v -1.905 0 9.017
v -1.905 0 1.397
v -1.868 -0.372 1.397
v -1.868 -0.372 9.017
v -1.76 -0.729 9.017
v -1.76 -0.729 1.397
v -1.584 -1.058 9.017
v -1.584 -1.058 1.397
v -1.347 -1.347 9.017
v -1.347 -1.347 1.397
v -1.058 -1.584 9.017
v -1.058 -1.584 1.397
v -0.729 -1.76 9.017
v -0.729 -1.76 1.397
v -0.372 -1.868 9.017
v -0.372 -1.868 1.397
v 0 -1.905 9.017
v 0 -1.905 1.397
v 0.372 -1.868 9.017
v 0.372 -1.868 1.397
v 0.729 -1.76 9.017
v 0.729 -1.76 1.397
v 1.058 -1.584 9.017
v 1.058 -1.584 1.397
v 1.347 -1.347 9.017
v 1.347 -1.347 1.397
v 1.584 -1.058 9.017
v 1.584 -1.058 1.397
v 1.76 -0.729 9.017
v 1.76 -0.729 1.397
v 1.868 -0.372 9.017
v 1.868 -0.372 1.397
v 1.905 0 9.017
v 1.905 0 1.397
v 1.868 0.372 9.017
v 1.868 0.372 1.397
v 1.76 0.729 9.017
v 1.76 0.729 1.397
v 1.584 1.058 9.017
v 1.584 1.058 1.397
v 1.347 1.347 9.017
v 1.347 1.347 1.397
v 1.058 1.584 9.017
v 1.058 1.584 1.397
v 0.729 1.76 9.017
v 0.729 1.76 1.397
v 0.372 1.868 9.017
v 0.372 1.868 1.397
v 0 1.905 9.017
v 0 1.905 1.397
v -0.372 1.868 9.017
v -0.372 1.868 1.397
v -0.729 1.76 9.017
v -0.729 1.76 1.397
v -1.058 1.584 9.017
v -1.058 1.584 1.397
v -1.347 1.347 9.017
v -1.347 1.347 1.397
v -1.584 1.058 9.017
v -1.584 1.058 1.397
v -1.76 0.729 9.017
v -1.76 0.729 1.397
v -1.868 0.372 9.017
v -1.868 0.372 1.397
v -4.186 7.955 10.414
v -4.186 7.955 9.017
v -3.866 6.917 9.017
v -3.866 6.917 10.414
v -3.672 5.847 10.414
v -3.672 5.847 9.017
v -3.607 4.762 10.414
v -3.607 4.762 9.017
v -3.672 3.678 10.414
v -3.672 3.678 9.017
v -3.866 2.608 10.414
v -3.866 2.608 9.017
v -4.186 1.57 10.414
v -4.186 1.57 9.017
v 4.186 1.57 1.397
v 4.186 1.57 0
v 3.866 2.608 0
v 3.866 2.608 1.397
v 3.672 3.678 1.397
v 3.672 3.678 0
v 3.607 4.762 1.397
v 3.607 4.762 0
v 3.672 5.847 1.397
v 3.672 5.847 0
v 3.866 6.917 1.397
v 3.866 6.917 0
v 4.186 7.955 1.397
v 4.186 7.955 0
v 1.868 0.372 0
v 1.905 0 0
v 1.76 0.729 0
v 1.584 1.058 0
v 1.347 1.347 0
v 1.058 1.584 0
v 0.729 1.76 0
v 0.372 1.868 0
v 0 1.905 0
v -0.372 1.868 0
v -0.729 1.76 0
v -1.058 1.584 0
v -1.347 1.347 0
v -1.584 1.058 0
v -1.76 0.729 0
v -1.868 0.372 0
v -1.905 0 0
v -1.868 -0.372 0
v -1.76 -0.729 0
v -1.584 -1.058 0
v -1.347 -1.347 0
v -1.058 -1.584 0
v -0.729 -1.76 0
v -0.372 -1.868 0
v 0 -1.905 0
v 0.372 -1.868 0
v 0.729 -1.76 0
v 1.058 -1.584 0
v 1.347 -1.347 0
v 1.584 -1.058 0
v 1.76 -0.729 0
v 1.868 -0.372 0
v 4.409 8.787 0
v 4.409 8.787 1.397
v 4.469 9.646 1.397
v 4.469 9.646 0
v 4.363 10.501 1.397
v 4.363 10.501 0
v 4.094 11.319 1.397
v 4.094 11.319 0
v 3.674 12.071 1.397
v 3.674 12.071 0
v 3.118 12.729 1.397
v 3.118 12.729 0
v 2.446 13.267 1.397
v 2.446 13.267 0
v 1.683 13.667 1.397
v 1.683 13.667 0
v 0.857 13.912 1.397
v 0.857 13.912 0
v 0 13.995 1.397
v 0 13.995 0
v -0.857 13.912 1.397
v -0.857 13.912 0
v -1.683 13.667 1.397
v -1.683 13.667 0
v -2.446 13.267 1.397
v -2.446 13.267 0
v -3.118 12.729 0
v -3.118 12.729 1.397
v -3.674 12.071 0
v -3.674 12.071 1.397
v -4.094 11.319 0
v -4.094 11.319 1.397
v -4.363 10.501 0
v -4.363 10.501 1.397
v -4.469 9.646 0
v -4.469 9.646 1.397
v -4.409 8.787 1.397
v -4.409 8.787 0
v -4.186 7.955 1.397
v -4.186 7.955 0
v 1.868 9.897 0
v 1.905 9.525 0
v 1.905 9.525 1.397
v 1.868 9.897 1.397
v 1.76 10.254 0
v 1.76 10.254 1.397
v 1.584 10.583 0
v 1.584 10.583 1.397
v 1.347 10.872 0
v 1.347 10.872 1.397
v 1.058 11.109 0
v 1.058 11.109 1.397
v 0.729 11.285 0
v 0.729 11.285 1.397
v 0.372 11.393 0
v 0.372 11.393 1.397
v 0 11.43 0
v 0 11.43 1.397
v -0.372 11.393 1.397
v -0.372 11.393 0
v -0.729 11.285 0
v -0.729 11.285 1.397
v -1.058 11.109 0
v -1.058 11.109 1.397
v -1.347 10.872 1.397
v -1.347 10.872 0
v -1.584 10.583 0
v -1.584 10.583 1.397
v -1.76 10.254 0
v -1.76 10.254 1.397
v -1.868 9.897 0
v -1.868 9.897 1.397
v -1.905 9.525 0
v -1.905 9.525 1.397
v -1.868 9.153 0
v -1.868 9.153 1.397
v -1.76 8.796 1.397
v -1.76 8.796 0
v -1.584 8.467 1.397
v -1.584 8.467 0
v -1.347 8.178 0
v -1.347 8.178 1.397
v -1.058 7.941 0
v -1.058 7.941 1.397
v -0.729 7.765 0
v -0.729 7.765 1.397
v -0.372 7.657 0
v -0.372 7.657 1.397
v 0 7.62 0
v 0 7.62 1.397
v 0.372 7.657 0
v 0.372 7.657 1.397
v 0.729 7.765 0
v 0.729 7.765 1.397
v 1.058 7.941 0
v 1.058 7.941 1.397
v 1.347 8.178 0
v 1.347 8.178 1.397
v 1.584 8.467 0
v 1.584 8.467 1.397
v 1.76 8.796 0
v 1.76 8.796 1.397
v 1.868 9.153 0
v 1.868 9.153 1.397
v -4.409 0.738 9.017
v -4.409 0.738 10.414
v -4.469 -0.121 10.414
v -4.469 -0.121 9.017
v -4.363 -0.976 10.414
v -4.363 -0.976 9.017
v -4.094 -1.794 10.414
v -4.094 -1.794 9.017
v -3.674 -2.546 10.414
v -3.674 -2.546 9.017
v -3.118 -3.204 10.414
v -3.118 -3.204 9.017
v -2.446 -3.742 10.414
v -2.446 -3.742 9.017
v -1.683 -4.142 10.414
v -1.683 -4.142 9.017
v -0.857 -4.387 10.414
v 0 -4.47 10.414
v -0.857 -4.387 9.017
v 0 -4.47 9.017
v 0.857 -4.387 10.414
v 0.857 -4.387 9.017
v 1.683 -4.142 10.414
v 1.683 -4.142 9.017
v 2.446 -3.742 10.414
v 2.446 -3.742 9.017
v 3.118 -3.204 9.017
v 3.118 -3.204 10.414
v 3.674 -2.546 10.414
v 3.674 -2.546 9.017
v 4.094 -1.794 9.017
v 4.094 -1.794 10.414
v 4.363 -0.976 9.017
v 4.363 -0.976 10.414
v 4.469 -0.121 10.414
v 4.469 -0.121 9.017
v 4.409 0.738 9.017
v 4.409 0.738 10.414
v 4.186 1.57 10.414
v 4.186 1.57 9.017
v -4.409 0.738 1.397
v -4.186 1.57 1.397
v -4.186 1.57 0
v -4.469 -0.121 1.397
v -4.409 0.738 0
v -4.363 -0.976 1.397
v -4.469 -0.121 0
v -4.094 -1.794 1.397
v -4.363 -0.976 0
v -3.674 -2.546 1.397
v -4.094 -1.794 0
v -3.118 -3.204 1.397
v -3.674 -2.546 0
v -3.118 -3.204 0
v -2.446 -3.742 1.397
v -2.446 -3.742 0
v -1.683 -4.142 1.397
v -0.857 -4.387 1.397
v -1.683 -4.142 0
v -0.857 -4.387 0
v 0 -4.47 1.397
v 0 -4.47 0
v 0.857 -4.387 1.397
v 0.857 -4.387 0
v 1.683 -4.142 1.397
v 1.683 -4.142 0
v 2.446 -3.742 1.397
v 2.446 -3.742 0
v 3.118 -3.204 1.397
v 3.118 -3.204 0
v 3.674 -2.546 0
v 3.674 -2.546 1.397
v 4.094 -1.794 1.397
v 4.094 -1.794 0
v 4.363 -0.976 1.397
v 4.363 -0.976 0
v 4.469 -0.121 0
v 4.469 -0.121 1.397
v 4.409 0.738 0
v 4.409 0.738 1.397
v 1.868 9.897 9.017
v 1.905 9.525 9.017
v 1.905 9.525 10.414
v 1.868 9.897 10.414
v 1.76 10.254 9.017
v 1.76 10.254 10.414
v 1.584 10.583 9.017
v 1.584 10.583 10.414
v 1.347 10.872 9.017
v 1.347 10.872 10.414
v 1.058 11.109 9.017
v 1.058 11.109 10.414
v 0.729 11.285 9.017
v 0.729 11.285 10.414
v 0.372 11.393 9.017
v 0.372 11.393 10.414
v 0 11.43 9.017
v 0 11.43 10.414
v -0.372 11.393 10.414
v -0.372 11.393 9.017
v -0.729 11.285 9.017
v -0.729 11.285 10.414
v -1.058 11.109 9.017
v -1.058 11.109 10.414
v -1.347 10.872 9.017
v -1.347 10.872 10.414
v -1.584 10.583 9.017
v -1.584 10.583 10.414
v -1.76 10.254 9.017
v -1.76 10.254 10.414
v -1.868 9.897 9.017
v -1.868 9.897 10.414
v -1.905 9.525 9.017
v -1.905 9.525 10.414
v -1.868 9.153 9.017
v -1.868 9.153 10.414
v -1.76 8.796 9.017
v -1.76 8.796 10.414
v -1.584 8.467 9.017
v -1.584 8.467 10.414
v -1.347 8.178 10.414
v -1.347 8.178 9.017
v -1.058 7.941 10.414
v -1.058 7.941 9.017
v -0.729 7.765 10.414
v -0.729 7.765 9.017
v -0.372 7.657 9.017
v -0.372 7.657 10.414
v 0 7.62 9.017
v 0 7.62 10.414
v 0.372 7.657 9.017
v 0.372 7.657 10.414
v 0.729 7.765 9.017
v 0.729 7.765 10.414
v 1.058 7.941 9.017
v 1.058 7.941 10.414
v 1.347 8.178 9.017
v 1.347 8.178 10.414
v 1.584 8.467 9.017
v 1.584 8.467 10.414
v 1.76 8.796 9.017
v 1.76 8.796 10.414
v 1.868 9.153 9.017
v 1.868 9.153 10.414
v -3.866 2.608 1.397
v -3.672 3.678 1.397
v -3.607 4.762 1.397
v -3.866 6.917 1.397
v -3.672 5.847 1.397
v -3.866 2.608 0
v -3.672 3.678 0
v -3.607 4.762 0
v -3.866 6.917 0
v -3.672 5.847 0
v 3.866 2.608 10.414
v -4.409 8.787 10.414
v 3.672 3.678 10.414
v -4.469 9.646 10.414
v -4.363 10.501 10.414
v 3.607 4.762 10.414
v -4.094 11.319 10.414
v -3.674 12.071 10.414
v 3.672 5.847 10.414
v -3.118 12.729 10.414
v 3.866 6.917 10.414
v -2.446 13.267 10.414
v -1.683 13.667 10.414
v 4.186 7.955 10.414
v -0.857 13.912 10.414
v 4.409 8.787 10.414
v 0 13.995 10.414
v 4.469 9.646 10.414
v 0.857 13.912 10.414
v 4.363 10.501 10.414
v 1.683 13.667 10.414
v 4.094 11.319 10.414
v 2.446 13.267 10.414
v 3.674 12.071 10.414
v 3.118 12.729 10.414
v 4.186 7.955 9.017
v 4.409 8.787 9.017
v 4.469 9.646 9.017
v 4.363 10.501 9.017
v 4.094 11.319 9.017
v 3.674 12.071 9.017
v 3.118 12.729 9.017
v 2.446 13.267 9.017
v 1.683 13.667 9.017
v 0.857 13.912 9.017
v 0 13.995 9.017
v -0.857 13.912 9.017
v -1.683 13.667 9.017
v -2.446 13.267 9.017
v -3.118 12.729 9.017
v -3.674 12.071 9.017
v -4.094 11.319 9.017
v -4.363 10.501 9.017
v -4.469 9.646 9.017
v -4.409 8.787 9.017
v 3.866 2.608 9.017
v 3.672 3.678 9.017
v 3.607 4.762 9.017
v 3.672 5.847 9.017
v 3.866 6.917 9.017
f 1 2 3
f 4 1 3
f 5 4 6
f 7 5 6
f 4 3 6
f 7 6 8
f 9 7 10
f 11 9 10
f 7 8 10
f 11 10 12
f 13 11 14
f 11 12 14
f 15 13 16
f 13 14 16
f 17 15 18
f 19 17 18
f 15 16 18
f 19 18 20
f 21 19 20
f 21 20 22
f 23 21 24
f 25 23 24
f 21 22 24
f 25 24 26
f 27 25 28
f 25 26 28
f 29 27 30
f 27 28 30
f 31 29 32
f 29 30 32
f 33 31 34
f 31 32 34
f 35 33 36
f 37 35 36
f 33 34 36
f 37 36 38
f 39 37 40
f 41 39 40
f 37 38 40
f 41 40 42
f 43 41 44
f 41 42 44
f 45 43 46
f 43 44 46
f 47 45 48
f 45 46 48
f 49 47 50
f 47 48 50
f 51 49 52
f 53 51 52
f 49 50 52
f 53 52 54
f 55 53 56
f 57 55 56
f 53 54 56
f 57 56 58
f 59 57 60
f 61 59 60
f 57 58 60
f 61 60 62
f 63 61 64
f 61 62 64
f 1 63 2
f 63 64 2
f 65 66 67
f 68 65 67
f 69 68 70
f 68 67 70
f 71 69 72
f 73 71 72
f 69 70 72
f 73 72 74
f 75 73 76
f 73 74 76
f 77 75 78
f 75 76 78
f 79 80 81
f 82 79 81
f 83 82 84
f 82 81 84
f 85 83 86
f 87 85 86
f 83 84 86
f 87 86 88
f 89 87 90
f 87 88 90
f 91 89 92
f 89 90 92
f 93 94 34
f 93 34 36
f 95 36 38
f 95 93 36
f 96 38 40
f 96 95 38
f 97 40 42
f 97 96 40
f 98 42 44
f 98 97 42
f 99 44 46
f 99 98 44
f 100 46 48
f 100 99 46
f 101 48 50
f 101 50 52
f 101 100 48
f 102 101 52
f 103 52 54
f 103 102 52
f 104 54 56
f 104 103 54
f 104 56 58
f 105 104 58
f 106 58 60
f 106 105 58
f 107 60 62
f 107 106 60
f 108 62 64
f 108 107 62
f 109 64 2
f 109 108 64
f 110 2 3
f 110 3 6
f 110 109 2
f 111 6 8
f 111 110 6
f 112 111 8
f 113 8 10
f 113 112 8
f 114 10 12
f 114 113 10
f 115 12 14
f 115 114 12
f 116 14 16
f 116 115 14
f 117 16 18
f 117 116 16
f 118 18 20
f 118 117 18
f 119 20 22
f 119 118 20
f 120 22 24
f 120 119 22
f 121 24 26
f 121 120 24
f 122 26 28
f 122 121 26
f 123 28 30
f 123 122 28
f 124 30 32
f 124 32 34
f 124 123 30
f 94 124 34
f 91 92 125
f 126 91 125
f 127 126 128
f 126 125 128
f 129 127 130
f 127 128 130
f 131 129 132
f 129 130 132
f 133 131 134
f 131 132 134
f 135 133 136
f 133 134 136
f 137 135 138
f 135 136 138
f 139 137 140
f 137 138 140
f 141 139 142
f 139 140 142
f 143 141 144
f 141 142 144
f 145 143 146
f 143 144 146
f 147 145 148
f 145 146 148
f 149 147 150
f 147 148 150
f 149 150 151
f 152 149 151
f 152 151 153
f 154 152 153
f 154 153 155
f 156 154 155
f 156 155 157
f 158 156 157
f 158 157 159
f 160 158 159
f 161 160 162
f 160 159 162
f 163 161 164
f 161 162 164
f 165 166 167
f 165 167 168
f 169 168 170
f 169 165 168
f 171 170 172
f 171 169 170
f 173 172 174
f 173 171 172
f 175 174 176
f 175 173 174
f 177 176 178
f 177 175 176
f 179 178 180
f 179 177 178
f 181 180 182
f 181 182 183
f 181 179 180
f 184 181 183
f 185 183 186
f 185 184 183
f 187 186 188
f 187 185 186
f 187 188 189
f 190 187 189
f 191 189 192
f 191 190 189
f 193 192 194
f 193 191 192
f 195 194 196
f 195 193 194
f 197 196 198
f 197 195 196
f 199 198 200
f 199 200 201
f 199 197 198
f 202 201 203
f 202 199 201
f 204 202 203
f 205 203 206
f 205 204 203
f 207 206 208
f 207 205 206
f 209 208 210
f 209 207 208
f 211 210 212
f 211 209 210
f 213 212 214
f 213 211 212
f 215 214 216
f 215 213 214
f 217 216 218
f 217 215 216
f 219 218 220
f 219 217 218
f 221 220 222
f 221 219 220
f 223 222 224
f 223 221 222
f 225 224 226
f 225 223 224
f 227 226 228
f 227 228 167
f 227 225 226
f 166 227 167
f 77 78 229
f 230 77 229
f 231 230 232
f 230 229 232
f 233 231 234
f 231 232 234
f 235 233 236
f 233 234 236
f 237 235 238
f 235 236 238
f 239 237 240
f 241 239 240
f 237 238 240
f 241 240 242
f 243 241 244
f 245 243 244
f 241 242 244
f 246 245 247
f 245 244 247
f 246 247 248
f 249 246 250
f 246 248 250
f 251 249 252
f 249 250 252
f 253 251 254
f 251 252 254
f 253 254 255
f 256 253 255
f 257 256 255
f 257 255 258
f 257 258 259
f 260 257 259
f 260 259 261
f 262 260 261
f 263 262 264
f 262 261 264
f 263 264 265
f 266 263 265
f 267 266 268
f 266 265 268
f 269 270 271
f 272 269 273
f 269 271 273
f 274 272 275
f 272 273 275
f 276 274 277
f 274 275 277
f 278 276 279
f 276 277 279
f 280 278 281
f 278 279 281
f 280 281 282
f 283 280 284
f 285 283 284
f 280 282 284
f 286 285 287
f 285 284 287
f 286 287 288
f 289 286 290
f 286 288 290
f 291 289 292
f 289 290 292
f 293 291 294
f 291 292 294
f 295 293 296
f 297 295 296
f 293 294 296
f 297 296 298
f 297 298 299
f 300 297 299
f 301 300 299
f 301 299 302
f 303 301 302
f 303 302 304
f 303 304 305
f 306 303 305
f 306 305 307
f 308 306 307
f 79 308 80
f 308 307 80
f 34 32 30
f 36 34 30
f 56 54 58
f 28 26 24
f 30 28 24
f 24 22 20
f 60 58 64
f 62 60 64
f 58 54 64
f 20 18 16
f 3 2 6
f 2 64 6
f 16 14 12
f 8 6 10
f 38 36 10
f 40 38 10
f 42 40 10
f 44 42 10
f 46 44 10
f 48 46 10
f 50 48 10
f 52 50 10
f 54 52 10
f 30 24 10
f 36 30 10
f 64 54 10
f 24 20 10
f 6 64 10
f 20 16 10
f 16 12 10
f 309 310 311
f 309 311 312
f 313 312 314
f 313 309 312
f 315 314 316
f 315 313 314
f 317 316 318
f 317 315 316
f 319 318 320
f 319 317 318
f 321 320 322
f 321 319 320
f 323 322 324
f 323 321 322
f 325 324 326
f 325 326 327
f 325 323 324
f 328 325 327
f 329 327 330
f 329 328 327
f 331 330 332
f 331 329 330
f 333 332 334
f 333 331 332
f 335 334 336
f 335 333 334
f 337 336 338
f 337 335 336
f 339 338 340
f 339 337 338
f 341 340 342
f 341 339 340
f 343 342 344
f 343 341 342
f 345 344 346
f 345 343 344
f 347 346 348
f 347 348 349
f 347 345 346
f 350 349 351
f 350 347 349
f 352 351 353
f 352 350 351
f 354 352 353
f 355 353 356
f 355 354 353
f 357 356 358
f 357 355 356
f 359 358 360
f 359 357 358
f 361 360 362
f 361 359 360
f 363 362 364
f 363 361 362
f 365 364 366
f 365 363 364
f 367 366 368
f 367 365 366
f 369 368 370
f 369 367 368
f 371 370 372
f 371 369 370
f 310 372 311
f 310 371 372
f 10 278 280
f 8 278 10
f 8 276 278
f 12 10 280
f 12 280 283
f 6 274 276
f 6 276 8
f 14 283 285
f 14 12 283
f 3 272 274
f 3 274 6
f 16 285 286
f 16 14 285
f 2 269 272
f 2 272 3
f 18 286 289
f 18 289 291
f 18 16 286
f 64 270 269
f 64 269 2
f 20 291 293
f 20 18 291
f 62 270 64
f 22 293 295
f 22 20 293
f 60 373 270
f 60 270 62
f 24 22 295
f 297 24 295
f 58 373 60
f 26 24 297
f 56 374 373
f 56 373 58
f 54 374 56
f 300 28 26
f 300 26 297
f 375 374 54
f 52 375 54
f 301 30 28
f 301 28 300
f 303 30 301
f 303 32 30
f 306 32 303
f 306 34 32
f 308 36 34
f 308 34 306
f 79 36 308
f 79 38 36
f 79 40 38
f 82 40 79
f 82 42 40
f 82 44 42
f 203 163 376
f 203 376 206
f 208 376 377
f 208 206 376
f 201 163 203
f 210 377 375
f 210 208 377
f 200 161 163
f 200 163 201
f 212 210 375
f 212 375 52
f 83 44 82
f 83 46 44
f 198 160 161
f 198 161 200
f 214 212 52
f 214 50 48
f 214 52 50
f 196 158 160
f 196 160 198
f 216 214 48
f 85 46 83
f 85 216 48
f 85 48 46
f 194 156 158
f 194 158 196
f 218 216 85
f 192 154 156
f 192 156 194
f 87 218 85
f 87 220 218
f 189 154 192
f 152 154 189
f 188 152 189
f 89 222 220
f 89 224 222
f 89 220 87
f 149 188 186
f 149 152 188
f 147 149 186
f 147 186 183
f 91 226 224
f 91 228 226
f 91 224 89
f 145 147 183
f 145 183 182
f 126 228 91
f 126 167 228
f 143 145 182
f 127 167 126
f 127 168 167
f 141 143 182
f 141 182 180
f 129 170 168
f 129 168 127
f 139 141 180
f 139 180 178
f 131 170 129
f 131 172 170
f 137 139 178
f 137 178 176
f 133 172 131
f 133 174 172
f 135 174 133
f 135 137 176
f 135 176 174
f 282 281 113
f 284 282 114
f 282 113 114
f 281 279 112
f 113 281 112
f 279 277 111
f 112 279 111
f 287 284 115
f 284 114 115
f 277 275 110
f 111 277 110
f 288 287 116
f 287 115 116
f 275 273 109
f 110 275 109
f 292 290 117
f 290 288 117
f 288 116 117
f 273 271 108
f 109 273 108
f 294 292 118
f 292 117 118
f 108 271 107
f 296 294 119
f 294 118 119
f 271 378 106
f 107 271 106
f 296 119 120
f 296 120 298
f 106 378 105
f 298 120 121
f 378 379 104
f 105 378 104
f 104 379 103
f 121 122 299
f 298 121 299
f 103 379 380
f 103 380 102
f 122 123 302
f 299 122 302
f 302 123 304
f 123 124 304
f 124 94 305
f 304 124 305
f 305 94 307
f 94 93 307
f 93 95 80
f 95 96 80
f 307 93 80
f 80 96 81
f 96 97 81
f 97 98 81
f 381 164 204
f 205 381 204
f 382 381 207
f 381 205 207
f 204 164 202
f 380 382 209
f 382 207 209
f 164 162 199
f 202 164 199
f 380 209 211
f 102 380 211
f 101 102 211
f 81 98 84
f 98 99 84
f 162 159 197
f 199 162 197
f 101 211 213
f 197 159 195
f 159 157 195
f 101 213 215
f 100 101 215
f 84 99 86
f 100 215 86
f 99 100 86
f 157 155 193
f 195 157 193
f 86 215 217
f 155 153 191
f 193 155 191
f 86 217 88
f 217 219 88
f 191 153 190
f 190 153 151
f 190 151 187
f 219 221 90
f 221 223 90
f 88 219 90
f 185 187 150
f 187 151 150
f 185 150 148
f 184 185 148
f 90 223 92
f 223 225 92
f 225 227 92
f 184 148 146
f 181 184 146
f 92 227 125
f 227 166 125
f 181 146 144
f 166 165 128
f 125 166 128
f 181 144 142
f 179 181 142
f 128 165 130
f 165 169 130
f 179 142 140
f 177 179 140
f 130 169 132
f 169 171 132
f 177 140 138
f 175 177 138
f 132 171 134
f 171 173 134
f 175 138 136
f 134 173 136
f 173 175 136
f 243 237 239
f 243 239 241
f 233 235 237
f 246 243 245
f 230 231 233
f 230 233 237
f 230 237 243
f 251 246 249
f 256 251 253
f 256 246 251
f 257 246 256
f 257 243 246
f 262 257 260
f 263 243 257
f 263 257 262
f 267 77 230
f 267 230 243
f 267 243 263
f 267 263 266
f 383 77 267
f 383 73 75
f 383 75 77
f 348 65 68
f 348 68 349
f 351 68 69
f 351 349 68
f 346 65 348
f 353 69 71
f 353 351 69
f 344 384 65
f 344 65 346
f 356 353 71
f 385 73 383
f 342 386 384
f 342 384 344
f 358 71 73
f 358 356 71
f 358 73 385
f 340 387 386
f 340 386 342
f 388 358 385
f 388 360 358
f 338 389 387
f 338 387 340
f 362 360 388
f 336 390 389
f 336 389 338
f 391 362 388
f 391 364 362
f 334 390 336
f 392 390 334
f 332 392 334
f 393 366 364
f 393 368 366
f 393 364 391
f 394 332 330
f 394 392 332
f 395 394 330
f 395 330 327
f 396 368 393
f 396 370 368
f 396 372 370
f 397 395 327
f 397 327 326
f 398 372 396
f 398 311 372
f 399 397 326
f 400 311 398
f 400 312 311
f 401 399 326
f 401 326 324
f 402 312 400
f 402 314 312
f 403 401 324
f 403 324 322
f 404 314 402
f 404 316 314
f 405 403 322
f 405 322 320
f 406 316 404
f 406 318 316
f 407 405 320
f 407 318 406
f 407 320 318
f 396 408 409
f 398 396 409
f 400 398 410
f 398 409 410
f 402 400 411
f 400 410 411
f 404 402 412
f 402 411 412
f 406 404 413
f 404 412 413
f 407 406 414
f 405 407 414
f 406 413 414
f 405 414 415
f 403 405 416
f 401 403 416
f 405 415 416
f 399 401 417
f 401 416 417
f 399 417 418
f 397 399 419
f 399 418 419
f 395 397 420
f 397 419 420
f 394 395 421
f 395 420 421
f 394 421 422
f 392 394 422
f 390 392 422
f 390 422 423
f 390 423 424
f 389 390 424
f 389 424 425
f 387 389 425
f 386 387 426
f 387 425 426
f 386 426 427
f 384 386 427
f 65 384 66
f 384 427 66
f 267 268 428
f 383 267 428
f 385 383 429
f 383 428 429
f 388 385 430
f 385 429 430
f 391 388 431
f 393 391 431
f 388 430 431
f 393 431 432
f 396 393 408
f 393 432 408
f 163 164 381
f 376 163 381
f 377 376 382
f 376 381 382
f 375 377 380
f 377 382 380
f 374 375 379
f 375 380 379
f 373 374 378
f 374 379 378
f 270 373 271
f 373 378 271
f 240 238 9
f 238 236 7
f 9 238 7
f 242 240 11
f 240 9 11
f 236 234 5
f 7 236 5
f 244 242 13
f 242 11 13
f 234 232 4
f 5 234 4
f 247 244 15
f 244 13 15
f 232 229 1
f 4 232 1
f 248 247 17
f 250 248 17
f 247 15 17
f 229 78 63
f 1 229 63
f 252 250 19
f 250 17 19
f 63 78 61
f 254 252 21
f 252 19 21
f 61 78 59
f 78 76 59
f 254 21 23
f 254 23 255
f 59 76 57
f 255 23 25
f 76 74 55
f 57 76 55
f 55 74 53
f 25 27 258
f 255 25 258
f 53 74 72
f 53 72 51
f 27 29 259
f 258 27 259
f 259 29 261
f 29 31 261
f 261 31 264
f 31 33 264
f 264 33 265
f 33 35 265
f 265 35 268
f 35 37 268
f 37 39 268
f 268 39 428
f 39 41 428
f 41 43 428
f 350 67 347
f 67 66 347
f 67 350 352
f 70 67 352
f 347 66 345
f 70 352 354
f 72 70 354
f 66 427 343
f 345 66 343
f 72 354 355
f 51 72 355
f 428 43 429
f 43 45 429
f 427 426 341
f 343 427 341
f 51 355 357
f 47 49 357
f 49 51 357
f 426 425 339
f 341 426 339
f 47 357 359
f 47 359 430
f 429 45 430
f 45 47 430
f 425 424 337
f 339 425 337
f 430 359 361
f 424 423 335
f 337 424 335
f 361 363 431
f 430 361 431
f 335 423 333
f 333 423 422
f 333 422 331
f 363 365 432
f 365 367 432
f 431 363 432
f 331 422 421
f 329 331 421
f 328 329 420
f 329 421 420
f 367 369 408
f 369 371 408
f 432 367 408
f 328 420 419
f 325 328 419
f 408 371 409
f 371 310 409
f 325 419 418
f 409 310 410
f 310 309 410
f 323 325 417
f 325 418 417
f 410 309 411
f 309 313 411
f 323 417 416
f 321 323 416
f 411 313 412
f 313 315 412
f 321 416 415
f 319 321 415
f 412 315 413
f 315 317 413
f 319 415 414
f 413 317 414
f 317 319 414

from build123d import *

# Parameters (mm, degrees)
SKETCH2_R           = 4.4704
SKETCH2_R_2         = 1.905
BOSS_EXTRUDE1_DEPTH = 1.397
SKETCH3_R           = 1.905
BOSS_EXTRUDE2_DEPTH = 7.62
SKETCH5_R           = 1.905
BOSS_EXTRUDE4_DEPTH = 1.397


with BuildPart() as part:
    # Sketch2 → Boss-Extrude1 (new body)
    # profile 1 of 3: a face of its own
    with BuildSketch(Plane.XY):
        Circle(SKETCH2_R)
        Circle(SKETCH2_R_2, mode=Mode.SUBTRACT)
    # profile 2 of 3: a face of its own
    with BuildSketch(Plane.XY):
        with BuildLine():
            ThreePointArc((-4.185765955, 1.569662233), (0, 4.4704), (4.185765955, 1.569662233))
            ThreePointArc((4.185765955, 1.569662233), (3.606794054, 4.7625), (4.185765955, 7.955337767))
            ThreePointArc((4.185765955, 7.955337767), (0, 5.0546), (-4.185765955, 7.955337767))
            ThreePointArc((-4.185765955, 7.955337767), (-3.606794054, 4.7625), (-4.185765955, 1.569662233))
        make_face()
    # profile 3 of 3: a face of its own
    with BuildSketch(Plane.XY):
        with Locations((0, 9.525)):
            Circle(SKETCH2_R)
        with Locations((0, 9.525)):
            Circle(SKETCH2_R_2, mode=Mode.SUBTRACT)
    extrude(amount=BOSS_EXTRUDE1_DEPTH)


with BuildPart() as body_2:
    # Sketch3 → Boss-Extrude2 (new body)
    with BuildSketch(Plane.XY.offset(1.397)):
        with Locations(Location((0, 0, 0), (0, 0, 180))):
            Circle(SKETCH3_R)
    extrude(amount=BOSS_EXTRUDE2_DEPTH)

    # Sketch5 → Boss-Extrude4 (add)
    with BuildSketch(Plane.XY.offset(9.017)):
        with BuildLine():
            ThreePointArc((-4.185765955, 1.569662233), (0, -4.4704), (4.185765955, 1.569662233))
            ThreePointArc((4.185765955, 1.569662233), (3.606794054, 4.7625), (4.185765955, 7.955337767))
            ThreePointArc((4.185765955, 7.955337767), (0, 13.9954), (-4.185765955, 7.955337767))
            ThreePointArc((-4.185765955, 7.955337767), (-3.606794054, 4.7625), (-4.185765955, 1.569662233))
        make_face()
        with Locations((0, 9.525)):
            Circle(SKETCH5_R, mode=Mode.SUBTRACT)
    extrude(amount=BOSS_EXTRUDE4_DEPTH)


solid = Compound([part.part, body_2.part])
